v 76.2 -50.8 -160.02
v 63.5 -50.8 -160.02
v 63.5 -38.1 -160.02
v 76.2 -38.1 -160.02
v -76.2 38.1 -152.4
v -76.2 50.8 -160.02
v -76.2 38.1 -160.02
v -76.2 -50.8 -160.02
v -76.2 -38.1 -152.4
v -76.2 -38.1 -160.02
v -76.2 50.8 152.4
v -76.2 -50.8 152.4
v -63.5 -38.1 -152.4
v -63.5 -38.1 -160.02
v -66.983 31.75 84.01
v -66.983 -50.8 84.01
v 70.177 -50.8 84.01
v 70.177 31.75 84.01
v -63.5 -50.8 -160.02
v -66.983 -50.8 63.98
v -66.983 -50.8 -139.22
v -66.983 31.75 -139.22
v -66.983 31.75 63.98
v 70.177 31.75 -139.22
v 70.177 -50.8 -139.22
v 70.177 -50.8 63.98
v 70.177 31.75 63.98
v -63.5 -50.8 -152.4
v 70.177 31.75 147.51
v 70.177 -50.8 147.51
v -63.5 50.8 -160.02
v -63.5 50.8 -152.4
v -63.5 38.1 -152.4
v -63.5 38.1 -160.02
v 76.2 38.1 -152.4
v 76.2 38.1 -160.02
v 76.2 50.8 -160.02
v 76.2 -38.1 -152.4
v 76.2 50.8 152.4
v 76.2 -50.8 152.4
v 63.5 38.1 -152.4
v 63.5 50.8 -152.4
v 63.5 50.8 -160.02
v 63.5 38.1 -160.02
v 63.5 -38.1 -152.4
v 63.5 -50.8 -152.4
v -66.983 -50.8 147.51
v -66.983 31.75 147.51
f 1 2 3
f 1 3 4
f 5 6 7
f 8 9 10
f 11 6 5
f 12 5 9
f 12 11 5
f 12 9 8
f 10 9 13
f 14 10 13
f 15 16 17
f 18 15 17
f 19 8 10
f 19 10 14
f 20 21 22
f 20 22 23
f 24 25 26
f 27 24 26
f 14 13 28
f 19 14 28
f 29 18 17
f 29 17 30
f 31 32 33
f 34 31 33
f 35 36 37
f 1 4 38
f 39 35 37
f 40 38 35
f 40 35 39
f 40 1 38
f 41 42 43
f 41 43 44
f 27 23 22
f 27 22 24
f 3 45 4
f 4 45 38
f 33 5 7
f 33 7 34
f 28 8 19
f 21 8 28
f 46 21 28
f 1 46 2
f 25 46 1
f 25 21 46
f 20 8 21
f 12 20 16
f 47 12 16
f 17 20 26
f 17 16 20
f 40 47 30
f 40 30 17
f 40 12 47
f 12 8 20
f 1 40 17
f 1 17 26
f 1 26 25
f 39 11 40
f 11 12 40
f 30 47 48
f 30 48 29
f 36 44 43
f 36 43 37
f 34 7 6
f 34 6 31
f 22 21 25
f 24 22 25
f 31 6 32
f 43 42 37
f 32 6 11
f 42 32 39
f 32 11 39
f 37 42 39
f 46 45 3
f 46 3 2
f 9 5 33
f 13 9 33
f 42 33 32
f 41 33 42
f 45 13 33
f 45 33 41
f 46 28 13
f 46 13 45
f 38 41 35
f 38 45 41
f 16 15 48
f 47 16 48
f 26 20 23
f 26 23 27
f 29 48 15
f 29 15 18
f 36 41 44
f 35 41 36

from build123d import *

# Parameters (mm, degrees)
F0_W     = 152.4
F0_H     = 304.8
F1_DEPTH = 50.8
F2_W     = 137.16
F2_H     = 63.5
F2_H_2   = 203.2
F3_DEPTH = 82.55
F4_W     = 12.7
F4_H     = 12.7
F5_DEPTH = 7.62


with BuildPart() as f1:
    # F0 (on Front) → F1 (new body, symmetric)
    with BuildSketch(Plane.XZ):
        Rectangle(F0_W, F0_H)
    extrude(amount=F1_DEPTH, both=True)

    # F2 (on face) → F3 (cut)
    with BuildSketch(Plane.XZ.offset(50.8)):
        with Locations((1.597112, 115.759528)):
            Rectangle(F2_W, F2_H)
        with Locations((1.597112, -37.619612)):
            Rectangle(F2_W, F2_H_2)
    extrude(amount=-F3_DEPTH, mode=Mode.SUBTRACT)

    # F4 (on face) → F5 (join)
    with BuildSketch(Plane(origin=(0, 0, -152.4), x_dir=(1, 0, 0), z_dir=(0, 0, -1))):
        with Locations((-69.85, 44.45)):
            Rectangle(F4_W, F4_H)
        with Locations((69.85, 44.45)):
            Rectangle(F4_W, F4_H)
        with Locations((-69.85, -44.45)):
            Rectangle(F4_W, F4_H)
        with Locations((69.85, -44.45)):
            Rectangle(F4_W, F4_H)
    extrude(amount=F5_DEPTH)


solid = f1.part
